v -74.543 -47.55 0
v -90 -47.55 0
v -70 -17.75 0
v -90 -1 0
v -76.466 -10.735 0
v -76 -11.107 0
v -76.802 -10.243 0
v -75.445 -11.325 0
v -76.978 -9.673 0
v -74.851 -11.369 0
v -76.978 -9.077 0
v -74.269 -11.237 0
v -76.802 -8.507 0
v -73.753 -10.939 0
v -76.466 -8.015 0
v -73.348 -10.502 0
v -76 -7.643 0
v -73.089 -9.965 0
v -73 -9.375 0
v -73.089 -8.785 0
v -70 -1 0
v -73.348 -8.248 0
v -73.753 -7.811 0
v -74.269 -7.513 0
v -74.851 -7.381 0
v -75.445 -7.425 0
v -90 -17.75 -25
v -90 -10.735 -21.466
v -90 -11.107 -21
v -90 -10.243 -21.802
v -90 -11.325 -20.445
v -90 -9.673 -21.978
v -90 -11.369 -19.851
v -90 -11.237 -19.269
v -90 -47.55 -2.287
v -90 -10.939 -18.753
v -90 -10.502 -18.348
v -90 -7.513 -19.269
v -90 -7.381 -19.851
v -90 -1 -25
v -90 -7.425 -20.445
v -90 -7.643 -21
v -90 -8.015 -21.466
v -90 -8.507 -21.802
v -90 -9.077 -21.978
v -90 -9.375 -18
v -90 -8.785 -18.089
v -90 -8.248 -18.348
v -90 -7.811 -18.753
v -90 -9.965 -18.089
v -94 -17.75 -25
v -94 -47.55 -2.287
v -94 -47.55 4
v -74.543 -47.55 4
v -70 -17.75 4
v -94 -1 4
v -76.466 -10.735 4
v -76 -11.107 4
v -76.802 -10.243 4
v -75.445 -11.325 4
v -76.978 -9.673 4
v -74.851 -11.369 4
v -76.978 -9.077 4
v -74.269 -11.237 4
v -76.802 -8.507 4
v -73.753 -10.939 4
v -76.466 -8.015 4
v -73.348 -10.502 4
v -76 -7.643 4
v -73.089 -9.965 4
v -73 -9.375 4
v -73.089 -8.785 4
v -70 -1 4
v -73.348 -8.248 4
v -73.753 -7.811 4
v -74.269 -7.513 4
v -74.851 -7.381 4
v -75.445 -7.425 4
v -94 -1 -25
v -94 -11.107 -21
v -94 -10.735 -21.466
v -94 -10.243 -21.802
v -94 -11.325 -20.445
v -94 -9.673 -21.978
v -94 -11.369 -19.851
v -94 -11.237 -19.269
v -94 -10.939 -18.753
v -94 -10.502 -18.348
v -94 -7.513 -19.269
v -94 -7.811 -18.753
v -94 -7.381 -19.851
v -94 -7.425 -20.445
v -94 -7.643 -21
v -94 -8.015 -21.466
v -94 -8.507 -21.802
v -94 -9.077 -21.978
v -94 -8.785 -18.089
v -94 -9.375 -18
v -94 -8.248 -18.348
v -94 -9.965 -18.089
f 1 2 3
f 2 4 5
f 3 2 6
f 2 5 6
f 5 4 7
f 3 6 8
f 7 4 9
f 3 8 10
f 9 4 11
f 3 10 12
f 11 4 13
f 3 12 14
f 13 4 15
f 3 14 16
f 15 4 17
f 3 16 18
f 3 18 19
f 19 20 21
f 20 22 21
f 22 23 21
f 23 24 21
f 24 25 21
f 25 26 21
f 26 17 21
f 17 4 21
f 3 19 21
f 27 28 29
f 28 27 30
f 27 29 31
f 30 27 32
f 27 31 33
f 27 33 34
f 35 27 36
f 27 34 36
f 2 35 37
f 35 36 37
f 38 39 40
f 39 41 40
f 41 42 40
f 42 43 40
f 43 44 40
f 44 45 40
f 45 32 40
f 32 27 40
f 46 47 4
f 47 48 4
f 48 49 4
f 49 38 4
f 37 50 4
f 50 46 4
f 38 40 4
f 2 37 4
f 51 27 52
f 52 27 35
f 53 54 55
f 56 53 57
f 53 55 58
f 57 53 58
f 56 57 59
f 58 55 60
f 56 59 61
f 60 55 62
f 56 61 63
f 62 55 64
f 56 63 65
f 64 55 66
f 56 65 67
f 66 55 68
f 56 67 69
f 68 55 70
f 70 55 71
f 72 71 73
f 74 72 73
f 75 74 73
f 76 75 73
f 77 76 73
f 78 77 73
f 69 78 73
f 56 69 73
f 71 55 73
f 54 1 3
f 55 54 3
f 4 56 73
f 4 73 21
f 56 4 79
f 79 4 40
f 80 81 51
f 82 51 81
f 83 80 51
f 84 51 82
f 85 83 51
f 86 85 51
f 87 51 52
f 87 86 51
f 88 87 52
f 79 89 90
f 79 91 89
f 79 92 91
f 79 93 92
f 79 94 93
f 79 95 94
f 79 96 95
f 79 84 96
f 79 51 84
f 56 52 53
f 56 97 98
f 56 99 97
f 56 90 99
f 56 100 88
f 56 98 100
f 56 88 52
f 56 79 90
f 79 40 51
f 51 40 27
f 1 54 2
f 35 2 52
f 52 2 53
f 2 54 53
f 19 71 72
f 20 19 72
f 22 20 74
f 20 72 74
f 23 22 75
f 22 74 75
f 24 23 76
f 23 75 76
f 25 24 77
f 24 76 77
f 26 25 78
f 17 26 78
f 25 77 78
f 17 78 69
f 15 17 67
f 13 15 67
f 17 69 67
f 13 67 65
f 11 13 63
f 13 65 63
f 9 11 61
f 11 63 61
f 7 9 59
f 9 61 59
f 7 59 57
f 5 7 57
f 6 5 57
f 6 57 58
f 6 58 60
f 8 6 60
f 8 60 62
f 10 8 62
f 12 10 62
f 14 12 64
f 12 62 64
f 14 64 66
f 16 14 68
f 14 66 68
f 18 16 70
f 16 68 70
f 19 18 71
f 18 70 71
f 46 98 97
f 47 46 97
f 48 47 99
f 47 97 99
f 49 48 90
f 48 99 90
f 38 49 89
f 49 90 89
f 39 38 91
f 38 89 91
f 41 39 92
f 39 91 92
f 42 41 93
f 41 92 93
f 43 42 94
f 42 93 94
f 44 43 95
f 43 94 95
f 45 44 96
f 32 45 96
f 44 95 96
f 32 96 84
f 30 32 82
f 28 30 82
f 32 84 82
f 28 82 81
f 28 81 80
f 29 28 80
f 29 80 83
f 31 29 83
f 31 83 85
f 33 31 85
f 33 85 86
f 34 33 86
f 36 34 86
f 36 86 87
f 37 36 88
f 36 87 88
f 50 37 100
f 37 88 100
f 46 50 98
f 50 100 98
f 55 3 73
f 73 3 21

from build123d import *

# Parameters (mm, degrees)
BOSS_EXTRUDE1_DEPTH = 4
BOSS_EXTRUDE2_DEPTH = 4
CUT_EXTRUDE1_DEPTH  = 111.599740054
SKETCH4_R           = 2
CUT_EXTRUDE2_DEPTH  = 4
SKETCH5_R           = 2
CUT_EXTRUDE3_DEPTH  = 4


with BuildPart() as part:
    # Sketch1 → Boss-Extrude1 (new body)
    with BuildSketch(Plane.XY):
        Polygon((-90, -50.55), (-75, -50.55), (-70, -17.75), (-70, -1), (-80, -1), (-90, -1), (-90, -17.75), align=None)
    extrude(amount=BOSS_EXTRUDE1_DEPTH)

    # Sketch2 → Boss-Extrude2 (add)
    with BuildSketch(Plane.ZY.offset(90)):
        Polygon((0, -1), (-25, -1), (-25, -17.75), (0, -50.55), (4, -50.55), (4, -1), align=None)
    extrude(amount=BOSS_EXTRUDE2_DEPTH)

    # Sketch3 → Cut-Extrude1 (cut, through all)
    with BuildSketch(Plane.XY.offset(4)):
        Polygon((-94, -49.55), (-94, -50.55), (-75, -50.55), (-74.542682927, -47.55), (-94, -47.55), align=None)
    extrude(amount=-CUT_EXTRUDE1_DEPTH, mode=Mode.SUBTRACT)

    # Sketch4 → Cut-Extrude2 (cut)
    with BuildSketch(Plane.XY.offset(4)):
        with Locations((-75, -9.375)):
            Circle(SKETCH4_R)
    extrude(amount=-CUT_EXTRUDE2_DEPTH, mode=Mode.SUBTRACT)

    # Sketch5 → Cut-Extrude3 (cut)
    with BuildSketch(Plane.ZY.offset(94)):
        with Locations((-20, -9.375)):
            Circle(SKETCH5_R)
    extrude(amount=-CUT_EXTRUDE3_DEPTH, mode=Mode.SUBTRACT)


solid = part.part
